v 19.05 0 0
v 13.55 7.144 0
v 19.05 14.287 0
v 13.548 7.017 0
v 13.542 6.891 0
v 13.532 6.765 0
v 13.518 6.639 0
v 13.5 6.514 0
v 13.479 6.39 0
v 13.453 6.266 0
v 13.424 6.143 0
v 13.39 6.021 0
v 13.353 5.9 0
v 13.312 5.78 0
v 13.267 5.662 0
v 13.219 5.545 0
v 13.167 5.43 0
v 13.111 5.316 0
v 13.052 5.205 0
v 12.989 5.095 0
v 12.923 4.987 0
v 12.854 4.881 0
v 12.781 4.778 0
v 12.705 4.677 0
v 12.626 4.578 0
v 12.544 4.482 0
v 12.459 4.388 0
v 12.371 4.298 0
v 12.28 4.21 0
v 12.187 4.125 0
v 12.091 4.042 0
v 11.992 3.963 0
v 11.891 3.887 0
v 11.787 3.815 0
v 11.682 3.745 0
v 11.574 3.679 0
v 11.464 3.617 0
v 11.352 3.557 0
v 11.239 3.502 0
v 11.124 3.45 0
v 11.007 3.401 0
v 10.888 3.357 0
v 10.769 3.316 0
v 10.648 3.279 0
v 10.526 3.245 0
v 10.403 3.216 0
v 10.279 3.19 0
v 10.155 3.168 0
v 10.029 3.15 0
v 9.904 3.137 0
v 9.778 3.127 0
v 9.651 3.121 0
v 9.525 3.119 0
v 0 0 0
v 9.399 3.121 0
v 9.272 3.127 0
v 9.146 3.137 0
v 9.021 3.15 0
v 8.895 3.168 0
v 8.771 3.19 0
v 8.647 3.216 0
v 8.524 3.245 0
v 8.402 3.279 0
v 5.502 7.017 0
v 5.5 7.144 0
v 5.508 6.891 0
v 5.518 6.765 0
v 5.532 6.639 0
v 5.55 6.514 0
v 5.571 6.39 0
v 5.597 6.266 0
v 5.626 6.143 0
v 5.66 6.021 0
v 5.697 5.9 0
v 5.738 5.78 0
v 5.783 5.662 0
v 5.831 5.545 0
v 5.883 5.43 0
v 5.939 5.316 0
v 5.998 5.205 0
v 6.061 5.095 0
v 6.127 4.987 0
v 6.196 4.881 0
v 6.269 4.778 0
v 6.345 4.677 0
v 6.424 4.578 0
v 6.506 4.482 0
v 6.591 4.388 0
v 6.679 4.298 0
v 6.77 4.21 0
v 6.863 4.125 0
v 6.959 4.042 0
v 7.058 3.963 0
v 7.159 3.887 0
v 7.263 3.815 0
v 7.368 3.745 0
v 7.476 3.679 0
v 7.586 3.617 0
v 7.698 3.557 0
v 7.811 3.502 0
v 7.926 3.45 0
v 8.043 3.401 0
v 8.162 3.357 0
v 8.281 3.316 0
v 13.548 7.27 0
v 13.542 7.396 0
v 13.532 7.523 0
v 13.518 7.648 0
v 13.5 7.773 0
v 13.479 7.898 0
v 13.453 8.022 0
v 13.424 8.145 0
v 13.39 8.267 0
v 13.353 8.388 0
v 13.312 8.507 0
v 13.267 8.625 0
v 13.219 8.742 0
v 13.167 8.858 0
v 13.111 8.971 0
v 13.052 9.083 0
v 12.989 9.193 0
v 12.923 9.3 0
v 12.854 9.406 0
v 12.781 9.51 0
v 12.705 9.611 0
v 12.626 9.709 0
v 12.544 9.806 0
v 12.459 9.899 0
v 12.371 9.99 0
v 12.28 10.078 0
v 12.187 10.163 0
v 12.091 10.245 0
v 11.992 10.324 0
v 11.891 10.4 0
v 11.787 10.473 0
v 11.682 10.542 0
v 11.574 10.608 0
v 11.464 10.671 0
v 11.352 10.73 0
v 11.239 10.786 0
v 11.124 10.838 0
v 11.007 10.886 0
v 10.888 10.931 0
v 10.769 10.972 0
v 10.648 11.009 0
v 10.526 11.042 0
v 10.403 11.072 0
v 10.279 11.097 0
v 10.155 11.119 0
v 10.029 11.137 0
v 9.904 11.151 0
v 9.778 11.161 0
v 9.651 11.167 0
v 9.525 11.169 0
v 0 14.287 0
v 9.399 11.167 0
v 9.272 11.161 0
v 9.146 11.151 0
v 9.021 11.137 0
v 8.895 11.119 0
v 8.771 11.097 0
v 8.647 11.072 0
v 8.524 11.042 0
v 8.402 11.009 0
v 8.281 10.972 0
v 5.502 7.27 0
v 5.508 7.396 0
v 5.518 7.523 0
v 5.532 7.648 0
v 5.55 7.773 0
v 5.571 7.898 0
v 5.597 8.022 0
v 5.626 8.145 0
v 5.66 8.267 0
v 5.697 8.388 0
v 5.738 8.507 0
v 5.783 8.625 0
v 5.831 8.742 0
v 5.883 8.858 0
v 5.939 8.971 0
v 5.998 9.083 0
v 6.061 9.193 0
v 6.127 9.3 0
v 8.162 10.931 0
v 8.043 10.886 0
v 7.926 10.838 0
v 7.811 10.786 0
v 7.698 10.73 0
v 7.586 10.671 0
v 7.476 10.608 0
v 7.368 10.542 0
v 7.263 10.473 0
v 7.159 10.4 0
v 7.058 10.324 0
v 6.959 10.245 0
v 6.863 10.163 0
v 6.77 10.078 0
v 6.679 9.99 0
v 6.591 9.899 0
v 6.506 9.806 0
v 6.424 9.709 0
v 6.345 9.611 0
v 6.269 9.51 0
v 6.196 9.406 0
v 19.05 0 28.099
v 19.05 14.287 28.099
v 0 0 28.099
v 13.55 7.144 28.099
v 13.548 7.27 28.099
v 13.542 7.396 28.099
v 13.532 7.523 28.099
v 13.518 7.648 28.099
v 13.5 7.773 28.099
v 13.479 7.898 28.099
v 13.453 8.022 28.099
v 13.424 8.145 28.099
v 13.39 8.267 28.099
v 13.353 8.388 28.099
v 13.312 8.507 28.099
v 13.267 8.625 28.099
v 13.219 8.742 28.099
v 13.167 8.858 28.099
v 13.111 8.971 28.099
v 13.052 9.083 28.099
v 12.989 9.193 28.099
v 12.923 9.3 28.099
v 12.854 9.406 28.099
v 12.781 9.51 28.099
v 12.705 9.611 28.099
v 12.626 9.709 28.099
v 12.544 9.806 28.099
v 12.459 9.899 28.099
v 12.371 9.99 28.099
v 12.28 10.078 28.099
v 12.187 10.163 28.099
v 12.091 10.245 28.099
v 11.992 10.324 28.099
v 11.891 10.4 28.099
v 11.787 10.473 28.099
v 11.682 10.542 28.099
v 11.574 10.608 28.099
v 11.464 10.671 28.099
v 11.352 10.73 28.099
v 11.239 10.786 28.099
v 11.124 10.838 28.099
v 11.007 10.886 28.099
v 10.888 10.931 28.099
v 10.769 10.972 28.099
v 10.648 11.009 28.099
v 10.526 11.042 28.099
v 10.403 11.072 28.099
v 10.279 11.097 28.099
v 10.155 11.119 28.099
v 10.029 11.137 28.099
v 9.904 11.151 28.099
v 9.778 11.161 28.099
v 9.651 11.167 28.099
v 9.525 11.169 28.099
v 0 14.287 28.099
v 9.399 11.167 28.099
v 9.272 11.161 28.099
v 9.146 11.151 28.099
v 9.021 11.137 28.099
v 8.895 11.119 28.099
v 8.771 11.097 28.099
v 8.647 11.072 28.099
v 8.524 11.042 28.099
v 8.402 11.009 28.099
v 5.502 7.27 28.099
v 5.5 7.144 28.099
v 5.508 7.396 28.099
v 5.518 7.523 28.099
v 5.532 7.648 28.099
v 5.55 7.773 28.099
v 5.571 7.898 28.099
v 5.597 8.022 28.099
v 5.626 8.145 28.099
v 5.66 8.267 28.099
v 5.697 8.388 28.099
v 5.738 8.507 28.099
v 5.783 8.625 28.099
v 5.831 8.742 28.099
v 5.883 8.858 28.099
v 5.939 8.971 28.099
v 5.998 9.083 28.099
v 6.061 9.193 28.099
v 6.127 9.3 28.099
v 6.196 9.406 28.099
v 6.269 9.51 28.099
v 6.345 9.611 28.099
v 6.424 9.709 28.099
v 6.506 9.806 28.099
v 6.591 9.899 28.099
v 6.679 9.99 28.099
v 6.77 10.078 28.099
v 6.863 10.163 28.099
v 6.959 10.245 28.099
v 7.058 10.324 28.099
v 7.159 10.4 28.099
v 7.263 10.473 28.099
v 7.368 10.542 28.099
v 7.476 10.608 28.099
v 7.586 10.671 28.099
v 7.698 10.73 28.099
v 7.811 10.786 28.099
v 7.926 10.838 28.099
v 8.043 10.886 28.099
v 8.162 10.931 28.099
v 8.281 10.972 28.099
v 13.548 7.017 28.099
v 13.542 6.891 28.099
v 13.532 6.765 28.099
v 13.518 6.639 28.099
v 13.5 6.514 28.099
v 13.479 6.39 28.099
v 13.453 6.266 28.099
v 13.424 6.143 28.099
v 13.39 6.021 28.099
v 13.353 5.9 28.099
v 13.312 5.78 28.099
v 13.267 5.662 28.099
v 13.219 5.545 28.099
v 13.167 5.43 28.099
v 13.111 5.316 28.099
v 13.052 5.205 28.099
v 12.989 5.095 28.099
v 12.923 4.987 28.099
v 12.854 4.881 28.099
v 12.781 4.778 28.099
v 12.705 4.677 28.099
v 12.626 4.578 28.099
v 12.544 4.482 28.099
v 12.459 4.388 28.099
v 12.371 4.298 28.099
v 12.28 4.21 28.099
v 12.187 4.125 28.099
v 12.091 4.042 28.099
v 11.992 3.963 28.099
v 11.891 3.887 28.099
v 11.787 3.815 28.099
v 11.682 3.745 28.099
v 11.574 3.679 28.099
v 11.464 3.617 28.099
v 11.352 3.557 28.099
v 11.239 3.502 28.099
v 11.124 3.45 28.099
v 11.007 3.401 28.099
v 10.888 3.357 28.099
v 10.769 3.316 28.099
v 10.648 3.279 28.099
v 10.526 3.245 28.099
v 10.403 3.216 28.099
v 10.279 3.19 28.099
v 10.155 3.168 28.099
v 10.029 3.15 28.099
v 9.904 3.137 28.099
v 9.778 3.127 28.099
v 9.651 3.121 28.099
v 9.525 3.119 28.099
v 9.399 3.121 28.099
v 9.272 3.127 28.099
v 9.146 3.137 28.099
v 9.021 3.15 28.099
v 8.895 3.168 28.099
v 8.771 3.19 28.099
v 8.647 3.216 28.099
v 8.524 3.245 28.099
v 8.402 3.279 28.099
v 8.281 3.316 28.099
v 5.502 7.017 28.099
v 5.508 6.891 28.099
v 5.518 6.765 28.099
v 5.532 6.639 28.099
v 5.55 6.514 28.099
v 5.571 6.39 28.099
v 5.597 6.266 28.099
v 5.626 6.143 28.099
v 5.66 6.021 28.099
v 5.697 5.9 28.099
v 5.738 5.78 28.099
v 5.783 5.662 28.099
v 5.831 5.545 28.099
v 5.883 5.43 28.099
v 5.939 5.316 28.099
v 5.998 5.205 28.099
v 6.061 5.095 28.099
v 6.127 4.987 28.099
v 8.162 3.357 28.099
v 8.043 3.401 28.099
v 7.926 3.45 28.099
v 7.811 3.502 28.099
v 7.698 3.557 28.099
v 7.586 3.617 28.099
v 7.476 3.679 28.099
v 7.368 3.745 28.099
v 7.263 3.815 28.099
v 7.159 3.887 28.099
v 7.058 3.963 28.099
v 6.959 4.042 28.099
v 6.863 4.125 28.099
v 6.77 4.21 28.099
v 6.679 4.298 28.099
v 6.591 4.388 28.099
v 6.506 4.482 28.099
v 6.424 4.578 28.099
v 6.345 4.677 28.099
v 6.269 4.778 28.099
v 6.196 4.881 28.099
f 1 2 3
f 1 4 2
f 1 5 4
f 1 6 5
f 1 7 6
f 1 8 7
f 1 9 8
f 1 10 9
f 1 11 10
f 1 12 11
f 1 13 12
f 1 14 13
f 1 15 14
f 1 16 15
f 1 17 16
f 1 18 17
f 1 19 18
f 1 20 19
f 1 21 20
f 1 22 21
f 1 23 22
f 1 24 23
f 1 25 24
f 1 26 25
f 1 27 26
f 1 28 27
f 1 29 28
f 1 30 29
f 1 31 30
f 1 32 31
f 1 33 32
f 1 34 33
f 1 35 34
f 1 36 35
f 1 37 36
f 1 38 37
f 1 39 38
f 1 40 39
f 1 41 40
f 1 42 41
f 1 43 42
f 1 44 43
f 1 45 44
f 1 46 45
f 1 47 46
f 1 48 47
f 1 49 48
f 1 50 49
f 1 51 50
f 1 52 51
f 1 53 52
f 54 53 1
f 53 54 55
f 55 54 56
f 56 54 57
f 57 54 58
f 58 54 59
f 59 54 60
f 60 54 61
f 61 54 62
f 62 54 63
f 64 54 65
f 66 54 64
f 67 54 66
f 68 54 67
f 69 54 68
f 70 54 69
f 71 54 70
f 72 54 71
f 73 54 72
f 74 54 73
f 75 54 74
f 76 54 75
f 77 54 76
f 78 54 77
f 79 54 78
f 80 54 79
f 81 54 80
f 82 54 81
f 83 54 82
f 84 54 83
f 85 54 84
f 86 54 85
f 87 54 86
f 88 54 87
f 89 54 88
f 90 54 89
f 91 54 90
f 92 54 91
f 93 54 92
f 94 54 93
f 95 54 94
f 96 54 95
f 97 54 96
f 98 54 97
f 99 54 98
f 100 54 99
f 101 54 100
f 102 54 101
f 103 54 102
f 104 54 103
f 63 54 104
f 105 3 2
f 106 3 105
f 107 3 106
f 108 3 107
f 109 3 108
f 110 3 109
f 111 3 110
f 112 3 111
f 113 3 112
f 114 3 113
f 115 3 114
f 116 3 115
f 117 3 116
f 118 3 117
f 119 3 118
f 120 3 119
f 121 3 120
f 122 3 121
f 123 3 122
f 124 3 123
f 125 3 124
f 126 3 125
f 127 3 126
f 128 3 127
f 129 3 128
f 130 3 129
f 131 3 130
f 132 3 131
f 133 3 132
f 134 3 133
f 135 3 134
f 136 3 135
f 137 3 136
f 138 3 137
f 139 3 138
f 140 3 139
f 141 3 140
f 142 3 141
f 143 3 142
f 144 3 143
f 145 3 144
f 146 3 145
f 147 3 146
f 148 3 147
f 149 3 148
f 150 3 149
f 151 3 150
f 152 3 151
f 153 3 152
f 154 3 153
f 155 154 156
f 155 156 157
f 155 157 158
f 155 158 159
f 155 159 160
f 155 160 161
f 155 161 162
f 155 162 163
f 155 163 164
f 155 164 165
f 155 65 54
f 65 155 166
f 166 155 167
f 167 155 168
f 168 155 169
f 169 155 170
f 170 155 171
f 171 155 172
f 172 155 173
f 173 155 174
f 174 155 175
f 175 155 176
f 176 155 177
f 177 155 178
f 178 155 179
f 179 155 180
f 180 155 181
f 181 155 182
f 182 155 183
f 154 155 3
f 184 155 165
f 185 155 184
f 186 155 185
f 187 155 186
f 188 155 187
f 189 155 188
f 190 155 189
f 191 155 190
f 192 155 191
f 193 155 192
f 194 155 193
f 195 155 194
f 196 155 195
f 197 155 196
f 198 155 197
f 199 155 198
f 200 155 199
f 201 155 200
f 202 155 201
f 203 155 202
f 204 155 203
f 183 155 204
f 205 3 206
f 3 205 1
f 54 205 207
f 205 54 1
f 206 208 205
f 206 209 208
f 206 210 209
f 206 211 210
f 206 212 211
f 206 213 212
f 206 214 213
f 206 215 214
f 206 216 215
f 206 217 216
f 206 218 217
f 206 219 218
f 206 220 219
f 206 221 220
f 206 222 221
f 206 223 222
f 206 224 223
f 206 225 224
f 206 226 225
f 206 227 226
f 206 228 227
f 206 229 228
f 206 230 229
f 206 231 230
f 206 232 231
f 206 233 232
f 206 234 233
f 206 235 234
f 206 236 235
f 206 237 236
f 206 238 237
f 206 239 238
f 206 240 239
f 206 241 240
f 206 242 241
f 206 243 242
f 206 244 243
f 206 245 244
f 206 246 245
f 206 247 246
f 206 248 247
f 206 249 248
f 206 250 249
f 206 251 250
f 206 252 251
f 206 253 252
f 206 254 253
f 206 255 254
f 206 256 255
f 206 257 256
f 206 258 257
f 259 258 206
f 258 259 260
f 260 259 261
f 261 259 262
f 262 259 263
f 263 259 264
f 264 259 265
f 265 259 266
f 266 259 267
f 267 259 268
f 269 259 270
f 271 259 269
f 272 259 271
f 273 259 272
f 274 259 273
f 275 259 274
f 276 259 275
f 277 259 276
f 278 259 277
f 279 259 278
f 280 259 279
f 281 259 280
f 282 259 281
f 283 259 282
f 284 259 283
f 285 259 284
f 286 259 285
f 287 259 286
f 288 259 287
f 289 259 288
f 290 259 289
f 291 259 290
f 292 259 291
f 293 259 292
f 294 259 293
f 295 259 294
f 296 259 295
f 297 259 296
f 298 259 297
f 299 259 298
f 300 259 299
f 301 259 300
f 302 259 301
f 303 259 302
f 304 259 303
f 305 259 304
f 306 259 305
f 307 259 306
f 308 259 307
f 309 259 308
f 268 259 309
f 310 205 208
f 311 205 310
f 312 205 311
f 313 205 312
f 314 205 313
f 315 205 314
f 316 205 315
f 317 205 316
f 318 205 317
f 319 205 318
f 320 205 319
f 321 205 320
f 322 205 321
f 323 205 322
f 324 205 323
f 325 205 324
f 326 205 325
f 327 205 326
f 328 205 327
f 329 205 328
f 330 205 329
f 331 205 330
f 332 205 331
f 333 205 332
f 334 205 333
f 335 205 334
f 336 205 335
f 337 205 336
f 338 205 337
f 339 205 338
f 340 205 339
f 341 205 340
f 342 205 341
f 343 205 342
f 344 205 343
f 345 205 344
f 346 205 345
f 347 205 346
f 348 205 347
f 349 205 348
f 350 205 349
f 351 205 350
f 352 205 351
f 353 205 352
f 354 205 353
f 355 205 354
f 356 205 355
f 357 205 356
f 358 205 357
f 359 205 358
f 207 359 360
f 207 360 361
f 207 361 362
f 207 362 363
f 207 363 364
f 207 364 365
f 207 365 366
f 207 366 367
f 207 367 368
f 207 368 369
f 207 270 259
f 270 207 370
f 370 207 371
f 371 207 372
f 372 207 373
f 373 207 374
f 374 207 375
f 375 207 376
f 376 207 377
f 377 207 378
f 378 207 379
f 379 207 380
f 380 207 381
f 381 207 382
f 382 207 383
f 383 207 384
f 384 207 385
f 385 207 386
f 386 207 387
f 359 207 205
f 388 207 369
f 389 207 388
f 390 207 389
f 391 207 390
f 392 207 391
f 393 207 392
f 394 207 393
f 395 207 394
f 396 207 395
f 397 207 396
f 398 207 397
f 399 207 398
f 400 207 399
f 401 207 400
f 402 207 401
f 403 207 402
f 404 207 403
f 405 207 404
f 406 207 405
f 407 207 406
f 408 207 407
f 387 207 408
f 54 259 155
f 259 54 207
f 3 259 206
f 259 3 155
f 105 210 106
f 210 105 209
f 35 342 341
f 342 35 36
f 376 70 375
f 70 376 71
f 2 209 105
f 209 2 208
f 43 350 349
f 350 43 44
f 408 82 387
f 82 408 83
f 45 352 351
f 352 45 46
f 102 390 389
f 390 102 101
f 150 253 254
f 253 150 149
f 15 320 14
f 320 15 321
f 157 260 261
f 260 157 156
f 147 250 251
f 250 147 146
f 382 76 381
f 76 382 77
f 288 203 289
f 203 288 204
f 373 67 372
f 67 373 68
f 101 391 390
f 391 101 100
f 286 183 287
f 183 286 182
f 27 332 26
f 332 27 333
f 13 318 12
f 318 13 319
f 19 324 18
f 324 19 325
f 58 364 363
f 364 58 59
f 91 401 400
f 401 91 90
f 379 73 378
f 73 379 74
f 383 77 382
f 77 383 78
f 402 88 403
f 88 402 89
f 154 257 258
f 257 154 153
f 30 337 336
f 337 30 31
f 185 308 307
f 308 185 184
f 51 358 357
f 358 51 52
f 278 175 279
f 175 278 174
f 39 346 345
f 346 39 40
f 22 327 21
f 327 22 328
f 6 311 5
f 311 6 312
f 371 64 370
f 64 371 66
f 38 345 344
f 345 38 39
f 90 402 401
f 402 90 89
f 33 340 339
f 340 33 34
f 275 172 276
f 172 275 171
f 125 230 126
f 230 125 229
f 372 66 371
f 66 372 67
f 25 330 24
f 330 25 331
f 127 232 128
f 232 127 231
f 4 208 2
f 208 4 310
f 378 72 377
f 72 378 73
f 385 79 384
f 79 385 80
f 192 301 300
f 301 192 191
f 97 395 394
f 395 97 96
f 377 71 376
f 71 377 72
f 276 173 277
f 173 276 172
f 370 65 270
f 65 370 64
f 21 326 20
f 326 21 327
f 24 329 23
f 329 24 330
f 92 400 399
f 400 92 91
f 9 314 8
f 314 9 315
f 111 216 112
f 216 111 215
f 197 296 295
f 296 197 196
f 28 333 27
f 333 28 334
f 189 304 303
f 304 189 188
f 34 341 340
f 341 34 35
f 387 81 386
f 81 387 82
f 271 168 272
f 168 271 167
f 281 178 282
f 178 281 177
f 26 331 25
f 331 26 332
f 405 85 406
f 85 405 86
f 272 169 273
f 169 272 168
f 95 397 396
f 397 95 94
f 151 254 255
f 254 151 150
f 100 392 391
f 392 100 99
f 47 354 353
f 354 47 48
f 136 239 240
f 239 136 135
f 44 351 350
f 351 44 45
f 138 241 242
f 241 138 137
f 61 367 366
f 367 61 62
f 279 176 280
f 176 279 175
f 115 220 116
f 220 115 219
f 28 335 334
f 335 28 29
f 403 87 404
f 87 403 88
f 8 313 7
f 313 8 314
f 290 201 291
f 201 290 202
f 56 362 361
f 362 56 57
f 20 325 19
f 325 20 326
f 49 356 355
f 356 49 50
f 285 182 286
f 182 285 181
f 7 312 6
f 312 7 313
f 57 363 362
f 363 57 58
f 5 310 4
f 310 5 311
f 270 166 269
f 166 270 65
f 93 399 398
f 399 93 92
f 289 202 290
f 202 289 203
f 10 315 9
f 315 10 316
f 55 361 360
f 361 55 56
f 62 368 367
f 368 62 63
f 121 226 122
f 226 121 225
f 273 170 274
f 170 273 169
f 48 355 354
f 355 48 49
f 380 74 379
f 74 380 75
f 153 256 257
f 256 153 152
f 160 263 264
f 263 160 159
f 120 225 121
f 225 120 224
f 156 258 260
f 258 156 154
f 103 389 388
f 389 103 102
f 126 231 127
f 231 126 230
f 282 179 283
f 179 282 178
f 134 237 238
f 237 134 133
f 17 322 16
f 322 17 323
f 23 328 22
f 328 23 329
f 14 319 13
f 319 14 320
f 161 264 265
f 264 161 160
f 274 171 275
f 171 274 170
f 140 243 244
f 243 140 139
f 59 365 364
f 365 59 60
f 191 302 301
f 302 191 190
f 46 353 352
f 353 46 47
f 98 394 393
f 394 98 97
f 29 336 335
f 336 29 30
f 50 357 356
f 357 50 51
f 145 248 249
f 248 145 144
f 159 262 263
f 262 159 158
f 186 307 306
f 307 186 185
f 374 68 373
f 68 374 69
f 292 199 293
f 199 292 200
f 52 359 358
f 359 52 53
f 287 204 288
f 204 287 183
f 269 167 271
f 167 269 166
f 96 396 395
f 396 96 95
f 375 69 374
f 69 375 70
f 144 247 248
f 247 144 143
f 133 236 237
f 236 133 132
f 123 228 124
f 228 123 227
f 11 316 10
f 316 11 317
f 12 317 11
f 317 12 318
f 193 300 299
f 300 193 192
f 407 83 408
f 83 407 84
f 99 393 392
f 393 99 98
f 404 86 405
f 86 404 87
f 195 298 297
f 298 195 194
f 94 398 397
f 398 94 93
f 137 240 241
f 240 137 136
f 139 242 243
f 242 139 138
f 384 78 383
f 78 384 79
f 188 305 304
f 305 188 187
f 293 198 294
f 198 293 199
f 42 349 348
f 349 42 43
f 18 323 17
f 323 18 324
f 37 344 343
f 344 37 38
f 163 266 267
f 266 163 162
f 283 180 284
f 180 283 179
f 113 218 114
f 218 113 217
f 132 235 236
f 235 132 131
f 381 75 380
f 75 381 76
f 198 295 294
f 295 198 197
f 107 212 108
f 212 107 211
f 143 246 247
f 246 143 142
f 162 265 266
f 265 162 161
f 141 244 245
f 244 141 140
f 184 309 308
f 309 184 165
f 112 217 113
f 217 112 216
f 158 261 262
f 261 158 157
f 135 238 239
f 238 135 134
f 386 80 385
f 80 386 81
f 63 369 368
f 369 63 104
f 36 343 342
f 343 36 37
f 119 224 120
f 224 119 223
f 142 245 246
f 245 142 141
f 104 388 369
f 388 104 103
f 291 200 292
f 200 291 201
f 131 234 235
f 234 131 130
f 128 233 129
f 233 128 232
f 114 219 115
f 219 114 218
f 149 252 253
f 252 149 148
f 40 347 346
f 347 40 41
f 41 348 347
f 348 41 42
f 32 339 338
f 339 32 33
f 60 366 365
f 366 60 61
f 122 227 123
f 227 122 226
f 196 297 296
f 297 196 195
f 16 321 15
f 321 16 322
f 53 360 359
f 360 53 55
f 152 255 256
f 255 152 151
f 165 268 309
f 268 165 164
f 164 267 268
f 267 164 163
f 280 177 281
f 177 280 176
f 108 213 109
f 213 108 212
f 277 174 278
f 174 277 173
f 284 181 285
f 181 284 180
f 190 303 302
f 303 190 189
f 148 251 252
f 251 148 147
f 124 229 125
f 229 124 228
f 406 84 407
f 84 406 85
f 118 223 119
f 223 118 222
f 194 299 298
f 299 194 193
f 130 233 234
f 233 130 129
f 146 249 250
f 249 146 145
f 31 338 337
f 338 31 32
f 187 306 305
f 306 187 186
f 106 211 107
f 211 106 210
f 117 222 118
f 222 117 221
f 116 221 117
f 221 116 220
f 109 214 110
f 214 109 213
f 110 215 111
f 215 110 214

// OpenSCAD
width = 19.05;
depth = 14.2875;
height = 1.475 * 19.05;
bolt = 8.05;

#difference()
{
linear_extrude(height = height )
{
	polygon(points=[[0, 0],[width, 0],[width, depth], [0, depth]]);

}

linear_extrude(height = height)
{
	translate([width/2, depth/2,0])
	{
		circle($fn = 200, r = bolt/2);
	}
}
}
